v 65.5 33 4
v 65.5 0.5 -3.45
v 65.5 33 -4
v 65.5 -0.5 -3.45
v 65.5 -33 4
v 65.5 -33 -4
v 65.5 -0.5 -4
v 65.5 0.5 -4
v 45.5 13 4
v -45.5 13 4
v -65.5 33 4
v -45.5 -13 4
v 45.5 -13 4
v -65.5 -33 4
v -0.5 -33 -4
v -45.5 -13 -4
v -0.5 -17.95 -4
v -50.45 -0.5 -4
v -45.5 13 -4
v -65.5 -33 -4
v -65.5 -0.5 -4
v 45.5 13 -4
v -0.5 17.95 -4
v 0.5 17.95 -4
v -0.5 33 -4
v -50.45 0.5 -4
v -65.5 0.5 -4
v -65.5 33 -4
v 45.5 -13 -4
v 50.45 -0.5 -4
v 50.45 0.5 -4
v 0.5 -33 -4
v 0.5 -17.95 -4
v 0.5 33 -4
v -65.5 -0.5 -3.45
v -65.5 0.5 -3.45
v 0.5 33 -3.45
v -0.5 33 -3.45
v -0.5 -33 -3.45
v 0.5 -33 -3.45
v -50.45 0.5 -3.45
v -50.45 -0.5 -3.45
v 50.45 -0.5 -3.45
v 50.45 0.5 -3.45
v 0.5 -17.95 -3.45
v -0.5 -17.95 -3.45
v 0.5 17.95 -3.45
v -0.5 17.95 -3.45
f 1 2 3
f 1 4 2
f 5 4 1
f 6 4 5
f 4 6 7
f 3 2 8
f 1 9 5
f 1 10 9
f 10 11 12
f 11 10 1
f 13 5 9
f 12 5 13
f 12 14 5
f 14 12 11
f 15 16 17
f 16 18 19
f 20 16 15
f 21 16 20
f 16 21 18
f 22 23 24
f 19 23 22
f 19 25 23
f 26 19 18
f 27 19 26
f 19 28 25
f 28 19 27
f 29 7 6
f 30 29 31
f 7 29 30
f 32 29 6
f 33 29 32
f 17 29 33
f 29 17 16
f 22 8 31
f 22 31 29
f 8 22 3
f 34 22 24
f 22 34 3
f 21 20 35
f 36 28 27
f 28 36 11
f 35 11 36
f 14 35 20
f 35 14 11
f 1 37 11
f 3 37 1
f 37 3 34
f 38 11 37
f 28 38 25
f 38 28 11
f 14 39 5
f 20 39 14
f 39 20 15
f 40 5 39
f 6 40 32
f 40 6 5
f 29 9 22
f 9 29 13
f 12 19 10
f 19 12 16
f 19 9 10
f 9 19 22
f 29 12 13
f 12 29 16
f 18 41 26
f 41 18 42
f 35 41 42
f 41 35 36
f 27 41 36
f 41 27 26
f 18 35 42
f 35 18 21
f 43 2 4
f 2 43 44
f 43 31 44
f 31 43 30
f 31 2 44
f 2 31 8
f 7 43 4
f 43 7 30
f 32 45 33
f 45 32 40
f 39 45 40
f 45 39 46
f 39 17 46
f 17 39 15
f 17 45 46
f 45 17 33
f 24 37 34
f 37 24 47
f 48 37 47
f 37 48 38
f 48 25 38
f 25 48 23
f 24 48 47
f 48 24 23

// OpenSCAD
// =========================================================================
// Wielkoformatowy Zegar Cyfrowy LED - Szablon Frezarski Cyfry (V27)
// =========================================================================
// Parametryczny szablon do frezowania otworów pilotujących w płycie MDF 18mm
// przy użyciu pierścienia kopiującego (Ø 17 mm) oraz frezu palcowego (Ø 8 mm).
// Offset wbudowany = (17 - 8) / 2 = 4.5 mm na stronę.
// =========================================================================

/* [Wybór Szablonu] */
// Typ szablonu do wyrenderowania: "large" (tablica wyników) lub "small" (zegar)
template_type = "large"; // [large, small]

/* [Parametry Narzędzia] */
guide_bush_d = 17; // Średnica pierścienia kopiującego (mm)
cutter_d = 8;      // Średnica frezu palcowego (mm)
tool_offset = (guide_bush_d - cutter_d) / 2; // Offset jednostronny (4.5 mm)

/* [Wymiary Bazy (MDF)] */
// Wymiary otworu docelowego w płycie MDF (bez offsetu)
pilot_w = (template_type == "large") ? 82 : 42;
pilot_h = (template_type == "large") ? 17 : 8;

/* [Wymiary Szablonu] */
margin = 20;        // Margines wokół otworu roboczego (mm)
thickness = 8;      // Grubość szablonu (mm)

// Obliczenie otworu wewnętrznego w szablonie (w którym porusza się pierścień)
inner_w = pilot_w + 2 * tool_offset; // Dla dużego: 91 mm, dla małego: 51 mm
inner_h = pilot_h + 2 * tool_offset; // Dla dużego: 26 mm, dla małego: 17 mm

// Bounding box szablonu
outer_w = inner_w + 2 * margin;
outer_h = inner_h + 2 * margin;

// Wymiary nacięć celowniczych (krzyży pomocniczych)
cross_depth = 0.5;   // Głębokość nacięcia (mm)
cross_width = 1.0;   // Szerokość linii nacięcia (mm)
cross_length = 15;   // Długość linii od krawędzi zewnętrznej (mm)

module template_body() {
    difference() {
        // Główna płyta szablonu
        cube([outer_w, outer_h, thickness], center = true);
        
        // Otwór roboczy pod pierścień kopiujący
        cube([inner_w, inner_h, thickness + 2], center = true);
        
        // Krzyże celownicze na dolnej powierzchni (z = -thickness/2)
        // Lewy krzyż celowniczy (oś X, strona lewa)
        translate([-outer_w/2 + cross_length/2, 0, -thickness/2 + cross_depth/2])
            cube([cross_length + 0.1, cross_width, cross_depth + 0.1], center = true);
            
        // Prawy krzyż celowniczy (oś X, strona prawa)
        translate([outer_w/2 - cross_length/2, 0, -thickness/2 + cross_depth/2])
            cube([cross_length + 0.1, cross_width, cross_depth + 0.1], center = true);
            
        // Dolny krzyż celowniczy (oś Y, strona dolna)
        translate([0, -outer_h/2 + cross_length/2, -thickness/2 + cross_depth/2])
            cube([cross_width, cross_length + 0.1, cross_depth + 0.1], center = true);
            
        // Górny krzyż celowniczy (oś Y, strona górna)
        translate([0, outer_h/2 - cross_length/2, -thickness/2 + cross_depth/2])
            cube([cross_width, cross_length + 0.1, cross_depth + 0.1], center = true);
    }
}

// Renderowanie szablonu
template_body();

// Informacje pomocnicze w konsoli OpenSCAD
echo("=================================================");
echo("ROZMIAR SZABLONU:", template_type);
echo("Wymiar zewnętrzny płyty:", outer_w, "x", outer_h, "mm");
echo("Otwór wewnętrzny (roboczy):", inner_w, "x", inner_h, "mm");
echo("Docelowy otwór pilotujący w MDF:", pilot_w, "x", pilot_h, "mm");
echo("Oczekiwany wymiar na froncie po fazowaniu 45° na głębokość 9mm:", pilot_w + 18, "x", pilot_h + 18, "mm");
echo("=================================================");
